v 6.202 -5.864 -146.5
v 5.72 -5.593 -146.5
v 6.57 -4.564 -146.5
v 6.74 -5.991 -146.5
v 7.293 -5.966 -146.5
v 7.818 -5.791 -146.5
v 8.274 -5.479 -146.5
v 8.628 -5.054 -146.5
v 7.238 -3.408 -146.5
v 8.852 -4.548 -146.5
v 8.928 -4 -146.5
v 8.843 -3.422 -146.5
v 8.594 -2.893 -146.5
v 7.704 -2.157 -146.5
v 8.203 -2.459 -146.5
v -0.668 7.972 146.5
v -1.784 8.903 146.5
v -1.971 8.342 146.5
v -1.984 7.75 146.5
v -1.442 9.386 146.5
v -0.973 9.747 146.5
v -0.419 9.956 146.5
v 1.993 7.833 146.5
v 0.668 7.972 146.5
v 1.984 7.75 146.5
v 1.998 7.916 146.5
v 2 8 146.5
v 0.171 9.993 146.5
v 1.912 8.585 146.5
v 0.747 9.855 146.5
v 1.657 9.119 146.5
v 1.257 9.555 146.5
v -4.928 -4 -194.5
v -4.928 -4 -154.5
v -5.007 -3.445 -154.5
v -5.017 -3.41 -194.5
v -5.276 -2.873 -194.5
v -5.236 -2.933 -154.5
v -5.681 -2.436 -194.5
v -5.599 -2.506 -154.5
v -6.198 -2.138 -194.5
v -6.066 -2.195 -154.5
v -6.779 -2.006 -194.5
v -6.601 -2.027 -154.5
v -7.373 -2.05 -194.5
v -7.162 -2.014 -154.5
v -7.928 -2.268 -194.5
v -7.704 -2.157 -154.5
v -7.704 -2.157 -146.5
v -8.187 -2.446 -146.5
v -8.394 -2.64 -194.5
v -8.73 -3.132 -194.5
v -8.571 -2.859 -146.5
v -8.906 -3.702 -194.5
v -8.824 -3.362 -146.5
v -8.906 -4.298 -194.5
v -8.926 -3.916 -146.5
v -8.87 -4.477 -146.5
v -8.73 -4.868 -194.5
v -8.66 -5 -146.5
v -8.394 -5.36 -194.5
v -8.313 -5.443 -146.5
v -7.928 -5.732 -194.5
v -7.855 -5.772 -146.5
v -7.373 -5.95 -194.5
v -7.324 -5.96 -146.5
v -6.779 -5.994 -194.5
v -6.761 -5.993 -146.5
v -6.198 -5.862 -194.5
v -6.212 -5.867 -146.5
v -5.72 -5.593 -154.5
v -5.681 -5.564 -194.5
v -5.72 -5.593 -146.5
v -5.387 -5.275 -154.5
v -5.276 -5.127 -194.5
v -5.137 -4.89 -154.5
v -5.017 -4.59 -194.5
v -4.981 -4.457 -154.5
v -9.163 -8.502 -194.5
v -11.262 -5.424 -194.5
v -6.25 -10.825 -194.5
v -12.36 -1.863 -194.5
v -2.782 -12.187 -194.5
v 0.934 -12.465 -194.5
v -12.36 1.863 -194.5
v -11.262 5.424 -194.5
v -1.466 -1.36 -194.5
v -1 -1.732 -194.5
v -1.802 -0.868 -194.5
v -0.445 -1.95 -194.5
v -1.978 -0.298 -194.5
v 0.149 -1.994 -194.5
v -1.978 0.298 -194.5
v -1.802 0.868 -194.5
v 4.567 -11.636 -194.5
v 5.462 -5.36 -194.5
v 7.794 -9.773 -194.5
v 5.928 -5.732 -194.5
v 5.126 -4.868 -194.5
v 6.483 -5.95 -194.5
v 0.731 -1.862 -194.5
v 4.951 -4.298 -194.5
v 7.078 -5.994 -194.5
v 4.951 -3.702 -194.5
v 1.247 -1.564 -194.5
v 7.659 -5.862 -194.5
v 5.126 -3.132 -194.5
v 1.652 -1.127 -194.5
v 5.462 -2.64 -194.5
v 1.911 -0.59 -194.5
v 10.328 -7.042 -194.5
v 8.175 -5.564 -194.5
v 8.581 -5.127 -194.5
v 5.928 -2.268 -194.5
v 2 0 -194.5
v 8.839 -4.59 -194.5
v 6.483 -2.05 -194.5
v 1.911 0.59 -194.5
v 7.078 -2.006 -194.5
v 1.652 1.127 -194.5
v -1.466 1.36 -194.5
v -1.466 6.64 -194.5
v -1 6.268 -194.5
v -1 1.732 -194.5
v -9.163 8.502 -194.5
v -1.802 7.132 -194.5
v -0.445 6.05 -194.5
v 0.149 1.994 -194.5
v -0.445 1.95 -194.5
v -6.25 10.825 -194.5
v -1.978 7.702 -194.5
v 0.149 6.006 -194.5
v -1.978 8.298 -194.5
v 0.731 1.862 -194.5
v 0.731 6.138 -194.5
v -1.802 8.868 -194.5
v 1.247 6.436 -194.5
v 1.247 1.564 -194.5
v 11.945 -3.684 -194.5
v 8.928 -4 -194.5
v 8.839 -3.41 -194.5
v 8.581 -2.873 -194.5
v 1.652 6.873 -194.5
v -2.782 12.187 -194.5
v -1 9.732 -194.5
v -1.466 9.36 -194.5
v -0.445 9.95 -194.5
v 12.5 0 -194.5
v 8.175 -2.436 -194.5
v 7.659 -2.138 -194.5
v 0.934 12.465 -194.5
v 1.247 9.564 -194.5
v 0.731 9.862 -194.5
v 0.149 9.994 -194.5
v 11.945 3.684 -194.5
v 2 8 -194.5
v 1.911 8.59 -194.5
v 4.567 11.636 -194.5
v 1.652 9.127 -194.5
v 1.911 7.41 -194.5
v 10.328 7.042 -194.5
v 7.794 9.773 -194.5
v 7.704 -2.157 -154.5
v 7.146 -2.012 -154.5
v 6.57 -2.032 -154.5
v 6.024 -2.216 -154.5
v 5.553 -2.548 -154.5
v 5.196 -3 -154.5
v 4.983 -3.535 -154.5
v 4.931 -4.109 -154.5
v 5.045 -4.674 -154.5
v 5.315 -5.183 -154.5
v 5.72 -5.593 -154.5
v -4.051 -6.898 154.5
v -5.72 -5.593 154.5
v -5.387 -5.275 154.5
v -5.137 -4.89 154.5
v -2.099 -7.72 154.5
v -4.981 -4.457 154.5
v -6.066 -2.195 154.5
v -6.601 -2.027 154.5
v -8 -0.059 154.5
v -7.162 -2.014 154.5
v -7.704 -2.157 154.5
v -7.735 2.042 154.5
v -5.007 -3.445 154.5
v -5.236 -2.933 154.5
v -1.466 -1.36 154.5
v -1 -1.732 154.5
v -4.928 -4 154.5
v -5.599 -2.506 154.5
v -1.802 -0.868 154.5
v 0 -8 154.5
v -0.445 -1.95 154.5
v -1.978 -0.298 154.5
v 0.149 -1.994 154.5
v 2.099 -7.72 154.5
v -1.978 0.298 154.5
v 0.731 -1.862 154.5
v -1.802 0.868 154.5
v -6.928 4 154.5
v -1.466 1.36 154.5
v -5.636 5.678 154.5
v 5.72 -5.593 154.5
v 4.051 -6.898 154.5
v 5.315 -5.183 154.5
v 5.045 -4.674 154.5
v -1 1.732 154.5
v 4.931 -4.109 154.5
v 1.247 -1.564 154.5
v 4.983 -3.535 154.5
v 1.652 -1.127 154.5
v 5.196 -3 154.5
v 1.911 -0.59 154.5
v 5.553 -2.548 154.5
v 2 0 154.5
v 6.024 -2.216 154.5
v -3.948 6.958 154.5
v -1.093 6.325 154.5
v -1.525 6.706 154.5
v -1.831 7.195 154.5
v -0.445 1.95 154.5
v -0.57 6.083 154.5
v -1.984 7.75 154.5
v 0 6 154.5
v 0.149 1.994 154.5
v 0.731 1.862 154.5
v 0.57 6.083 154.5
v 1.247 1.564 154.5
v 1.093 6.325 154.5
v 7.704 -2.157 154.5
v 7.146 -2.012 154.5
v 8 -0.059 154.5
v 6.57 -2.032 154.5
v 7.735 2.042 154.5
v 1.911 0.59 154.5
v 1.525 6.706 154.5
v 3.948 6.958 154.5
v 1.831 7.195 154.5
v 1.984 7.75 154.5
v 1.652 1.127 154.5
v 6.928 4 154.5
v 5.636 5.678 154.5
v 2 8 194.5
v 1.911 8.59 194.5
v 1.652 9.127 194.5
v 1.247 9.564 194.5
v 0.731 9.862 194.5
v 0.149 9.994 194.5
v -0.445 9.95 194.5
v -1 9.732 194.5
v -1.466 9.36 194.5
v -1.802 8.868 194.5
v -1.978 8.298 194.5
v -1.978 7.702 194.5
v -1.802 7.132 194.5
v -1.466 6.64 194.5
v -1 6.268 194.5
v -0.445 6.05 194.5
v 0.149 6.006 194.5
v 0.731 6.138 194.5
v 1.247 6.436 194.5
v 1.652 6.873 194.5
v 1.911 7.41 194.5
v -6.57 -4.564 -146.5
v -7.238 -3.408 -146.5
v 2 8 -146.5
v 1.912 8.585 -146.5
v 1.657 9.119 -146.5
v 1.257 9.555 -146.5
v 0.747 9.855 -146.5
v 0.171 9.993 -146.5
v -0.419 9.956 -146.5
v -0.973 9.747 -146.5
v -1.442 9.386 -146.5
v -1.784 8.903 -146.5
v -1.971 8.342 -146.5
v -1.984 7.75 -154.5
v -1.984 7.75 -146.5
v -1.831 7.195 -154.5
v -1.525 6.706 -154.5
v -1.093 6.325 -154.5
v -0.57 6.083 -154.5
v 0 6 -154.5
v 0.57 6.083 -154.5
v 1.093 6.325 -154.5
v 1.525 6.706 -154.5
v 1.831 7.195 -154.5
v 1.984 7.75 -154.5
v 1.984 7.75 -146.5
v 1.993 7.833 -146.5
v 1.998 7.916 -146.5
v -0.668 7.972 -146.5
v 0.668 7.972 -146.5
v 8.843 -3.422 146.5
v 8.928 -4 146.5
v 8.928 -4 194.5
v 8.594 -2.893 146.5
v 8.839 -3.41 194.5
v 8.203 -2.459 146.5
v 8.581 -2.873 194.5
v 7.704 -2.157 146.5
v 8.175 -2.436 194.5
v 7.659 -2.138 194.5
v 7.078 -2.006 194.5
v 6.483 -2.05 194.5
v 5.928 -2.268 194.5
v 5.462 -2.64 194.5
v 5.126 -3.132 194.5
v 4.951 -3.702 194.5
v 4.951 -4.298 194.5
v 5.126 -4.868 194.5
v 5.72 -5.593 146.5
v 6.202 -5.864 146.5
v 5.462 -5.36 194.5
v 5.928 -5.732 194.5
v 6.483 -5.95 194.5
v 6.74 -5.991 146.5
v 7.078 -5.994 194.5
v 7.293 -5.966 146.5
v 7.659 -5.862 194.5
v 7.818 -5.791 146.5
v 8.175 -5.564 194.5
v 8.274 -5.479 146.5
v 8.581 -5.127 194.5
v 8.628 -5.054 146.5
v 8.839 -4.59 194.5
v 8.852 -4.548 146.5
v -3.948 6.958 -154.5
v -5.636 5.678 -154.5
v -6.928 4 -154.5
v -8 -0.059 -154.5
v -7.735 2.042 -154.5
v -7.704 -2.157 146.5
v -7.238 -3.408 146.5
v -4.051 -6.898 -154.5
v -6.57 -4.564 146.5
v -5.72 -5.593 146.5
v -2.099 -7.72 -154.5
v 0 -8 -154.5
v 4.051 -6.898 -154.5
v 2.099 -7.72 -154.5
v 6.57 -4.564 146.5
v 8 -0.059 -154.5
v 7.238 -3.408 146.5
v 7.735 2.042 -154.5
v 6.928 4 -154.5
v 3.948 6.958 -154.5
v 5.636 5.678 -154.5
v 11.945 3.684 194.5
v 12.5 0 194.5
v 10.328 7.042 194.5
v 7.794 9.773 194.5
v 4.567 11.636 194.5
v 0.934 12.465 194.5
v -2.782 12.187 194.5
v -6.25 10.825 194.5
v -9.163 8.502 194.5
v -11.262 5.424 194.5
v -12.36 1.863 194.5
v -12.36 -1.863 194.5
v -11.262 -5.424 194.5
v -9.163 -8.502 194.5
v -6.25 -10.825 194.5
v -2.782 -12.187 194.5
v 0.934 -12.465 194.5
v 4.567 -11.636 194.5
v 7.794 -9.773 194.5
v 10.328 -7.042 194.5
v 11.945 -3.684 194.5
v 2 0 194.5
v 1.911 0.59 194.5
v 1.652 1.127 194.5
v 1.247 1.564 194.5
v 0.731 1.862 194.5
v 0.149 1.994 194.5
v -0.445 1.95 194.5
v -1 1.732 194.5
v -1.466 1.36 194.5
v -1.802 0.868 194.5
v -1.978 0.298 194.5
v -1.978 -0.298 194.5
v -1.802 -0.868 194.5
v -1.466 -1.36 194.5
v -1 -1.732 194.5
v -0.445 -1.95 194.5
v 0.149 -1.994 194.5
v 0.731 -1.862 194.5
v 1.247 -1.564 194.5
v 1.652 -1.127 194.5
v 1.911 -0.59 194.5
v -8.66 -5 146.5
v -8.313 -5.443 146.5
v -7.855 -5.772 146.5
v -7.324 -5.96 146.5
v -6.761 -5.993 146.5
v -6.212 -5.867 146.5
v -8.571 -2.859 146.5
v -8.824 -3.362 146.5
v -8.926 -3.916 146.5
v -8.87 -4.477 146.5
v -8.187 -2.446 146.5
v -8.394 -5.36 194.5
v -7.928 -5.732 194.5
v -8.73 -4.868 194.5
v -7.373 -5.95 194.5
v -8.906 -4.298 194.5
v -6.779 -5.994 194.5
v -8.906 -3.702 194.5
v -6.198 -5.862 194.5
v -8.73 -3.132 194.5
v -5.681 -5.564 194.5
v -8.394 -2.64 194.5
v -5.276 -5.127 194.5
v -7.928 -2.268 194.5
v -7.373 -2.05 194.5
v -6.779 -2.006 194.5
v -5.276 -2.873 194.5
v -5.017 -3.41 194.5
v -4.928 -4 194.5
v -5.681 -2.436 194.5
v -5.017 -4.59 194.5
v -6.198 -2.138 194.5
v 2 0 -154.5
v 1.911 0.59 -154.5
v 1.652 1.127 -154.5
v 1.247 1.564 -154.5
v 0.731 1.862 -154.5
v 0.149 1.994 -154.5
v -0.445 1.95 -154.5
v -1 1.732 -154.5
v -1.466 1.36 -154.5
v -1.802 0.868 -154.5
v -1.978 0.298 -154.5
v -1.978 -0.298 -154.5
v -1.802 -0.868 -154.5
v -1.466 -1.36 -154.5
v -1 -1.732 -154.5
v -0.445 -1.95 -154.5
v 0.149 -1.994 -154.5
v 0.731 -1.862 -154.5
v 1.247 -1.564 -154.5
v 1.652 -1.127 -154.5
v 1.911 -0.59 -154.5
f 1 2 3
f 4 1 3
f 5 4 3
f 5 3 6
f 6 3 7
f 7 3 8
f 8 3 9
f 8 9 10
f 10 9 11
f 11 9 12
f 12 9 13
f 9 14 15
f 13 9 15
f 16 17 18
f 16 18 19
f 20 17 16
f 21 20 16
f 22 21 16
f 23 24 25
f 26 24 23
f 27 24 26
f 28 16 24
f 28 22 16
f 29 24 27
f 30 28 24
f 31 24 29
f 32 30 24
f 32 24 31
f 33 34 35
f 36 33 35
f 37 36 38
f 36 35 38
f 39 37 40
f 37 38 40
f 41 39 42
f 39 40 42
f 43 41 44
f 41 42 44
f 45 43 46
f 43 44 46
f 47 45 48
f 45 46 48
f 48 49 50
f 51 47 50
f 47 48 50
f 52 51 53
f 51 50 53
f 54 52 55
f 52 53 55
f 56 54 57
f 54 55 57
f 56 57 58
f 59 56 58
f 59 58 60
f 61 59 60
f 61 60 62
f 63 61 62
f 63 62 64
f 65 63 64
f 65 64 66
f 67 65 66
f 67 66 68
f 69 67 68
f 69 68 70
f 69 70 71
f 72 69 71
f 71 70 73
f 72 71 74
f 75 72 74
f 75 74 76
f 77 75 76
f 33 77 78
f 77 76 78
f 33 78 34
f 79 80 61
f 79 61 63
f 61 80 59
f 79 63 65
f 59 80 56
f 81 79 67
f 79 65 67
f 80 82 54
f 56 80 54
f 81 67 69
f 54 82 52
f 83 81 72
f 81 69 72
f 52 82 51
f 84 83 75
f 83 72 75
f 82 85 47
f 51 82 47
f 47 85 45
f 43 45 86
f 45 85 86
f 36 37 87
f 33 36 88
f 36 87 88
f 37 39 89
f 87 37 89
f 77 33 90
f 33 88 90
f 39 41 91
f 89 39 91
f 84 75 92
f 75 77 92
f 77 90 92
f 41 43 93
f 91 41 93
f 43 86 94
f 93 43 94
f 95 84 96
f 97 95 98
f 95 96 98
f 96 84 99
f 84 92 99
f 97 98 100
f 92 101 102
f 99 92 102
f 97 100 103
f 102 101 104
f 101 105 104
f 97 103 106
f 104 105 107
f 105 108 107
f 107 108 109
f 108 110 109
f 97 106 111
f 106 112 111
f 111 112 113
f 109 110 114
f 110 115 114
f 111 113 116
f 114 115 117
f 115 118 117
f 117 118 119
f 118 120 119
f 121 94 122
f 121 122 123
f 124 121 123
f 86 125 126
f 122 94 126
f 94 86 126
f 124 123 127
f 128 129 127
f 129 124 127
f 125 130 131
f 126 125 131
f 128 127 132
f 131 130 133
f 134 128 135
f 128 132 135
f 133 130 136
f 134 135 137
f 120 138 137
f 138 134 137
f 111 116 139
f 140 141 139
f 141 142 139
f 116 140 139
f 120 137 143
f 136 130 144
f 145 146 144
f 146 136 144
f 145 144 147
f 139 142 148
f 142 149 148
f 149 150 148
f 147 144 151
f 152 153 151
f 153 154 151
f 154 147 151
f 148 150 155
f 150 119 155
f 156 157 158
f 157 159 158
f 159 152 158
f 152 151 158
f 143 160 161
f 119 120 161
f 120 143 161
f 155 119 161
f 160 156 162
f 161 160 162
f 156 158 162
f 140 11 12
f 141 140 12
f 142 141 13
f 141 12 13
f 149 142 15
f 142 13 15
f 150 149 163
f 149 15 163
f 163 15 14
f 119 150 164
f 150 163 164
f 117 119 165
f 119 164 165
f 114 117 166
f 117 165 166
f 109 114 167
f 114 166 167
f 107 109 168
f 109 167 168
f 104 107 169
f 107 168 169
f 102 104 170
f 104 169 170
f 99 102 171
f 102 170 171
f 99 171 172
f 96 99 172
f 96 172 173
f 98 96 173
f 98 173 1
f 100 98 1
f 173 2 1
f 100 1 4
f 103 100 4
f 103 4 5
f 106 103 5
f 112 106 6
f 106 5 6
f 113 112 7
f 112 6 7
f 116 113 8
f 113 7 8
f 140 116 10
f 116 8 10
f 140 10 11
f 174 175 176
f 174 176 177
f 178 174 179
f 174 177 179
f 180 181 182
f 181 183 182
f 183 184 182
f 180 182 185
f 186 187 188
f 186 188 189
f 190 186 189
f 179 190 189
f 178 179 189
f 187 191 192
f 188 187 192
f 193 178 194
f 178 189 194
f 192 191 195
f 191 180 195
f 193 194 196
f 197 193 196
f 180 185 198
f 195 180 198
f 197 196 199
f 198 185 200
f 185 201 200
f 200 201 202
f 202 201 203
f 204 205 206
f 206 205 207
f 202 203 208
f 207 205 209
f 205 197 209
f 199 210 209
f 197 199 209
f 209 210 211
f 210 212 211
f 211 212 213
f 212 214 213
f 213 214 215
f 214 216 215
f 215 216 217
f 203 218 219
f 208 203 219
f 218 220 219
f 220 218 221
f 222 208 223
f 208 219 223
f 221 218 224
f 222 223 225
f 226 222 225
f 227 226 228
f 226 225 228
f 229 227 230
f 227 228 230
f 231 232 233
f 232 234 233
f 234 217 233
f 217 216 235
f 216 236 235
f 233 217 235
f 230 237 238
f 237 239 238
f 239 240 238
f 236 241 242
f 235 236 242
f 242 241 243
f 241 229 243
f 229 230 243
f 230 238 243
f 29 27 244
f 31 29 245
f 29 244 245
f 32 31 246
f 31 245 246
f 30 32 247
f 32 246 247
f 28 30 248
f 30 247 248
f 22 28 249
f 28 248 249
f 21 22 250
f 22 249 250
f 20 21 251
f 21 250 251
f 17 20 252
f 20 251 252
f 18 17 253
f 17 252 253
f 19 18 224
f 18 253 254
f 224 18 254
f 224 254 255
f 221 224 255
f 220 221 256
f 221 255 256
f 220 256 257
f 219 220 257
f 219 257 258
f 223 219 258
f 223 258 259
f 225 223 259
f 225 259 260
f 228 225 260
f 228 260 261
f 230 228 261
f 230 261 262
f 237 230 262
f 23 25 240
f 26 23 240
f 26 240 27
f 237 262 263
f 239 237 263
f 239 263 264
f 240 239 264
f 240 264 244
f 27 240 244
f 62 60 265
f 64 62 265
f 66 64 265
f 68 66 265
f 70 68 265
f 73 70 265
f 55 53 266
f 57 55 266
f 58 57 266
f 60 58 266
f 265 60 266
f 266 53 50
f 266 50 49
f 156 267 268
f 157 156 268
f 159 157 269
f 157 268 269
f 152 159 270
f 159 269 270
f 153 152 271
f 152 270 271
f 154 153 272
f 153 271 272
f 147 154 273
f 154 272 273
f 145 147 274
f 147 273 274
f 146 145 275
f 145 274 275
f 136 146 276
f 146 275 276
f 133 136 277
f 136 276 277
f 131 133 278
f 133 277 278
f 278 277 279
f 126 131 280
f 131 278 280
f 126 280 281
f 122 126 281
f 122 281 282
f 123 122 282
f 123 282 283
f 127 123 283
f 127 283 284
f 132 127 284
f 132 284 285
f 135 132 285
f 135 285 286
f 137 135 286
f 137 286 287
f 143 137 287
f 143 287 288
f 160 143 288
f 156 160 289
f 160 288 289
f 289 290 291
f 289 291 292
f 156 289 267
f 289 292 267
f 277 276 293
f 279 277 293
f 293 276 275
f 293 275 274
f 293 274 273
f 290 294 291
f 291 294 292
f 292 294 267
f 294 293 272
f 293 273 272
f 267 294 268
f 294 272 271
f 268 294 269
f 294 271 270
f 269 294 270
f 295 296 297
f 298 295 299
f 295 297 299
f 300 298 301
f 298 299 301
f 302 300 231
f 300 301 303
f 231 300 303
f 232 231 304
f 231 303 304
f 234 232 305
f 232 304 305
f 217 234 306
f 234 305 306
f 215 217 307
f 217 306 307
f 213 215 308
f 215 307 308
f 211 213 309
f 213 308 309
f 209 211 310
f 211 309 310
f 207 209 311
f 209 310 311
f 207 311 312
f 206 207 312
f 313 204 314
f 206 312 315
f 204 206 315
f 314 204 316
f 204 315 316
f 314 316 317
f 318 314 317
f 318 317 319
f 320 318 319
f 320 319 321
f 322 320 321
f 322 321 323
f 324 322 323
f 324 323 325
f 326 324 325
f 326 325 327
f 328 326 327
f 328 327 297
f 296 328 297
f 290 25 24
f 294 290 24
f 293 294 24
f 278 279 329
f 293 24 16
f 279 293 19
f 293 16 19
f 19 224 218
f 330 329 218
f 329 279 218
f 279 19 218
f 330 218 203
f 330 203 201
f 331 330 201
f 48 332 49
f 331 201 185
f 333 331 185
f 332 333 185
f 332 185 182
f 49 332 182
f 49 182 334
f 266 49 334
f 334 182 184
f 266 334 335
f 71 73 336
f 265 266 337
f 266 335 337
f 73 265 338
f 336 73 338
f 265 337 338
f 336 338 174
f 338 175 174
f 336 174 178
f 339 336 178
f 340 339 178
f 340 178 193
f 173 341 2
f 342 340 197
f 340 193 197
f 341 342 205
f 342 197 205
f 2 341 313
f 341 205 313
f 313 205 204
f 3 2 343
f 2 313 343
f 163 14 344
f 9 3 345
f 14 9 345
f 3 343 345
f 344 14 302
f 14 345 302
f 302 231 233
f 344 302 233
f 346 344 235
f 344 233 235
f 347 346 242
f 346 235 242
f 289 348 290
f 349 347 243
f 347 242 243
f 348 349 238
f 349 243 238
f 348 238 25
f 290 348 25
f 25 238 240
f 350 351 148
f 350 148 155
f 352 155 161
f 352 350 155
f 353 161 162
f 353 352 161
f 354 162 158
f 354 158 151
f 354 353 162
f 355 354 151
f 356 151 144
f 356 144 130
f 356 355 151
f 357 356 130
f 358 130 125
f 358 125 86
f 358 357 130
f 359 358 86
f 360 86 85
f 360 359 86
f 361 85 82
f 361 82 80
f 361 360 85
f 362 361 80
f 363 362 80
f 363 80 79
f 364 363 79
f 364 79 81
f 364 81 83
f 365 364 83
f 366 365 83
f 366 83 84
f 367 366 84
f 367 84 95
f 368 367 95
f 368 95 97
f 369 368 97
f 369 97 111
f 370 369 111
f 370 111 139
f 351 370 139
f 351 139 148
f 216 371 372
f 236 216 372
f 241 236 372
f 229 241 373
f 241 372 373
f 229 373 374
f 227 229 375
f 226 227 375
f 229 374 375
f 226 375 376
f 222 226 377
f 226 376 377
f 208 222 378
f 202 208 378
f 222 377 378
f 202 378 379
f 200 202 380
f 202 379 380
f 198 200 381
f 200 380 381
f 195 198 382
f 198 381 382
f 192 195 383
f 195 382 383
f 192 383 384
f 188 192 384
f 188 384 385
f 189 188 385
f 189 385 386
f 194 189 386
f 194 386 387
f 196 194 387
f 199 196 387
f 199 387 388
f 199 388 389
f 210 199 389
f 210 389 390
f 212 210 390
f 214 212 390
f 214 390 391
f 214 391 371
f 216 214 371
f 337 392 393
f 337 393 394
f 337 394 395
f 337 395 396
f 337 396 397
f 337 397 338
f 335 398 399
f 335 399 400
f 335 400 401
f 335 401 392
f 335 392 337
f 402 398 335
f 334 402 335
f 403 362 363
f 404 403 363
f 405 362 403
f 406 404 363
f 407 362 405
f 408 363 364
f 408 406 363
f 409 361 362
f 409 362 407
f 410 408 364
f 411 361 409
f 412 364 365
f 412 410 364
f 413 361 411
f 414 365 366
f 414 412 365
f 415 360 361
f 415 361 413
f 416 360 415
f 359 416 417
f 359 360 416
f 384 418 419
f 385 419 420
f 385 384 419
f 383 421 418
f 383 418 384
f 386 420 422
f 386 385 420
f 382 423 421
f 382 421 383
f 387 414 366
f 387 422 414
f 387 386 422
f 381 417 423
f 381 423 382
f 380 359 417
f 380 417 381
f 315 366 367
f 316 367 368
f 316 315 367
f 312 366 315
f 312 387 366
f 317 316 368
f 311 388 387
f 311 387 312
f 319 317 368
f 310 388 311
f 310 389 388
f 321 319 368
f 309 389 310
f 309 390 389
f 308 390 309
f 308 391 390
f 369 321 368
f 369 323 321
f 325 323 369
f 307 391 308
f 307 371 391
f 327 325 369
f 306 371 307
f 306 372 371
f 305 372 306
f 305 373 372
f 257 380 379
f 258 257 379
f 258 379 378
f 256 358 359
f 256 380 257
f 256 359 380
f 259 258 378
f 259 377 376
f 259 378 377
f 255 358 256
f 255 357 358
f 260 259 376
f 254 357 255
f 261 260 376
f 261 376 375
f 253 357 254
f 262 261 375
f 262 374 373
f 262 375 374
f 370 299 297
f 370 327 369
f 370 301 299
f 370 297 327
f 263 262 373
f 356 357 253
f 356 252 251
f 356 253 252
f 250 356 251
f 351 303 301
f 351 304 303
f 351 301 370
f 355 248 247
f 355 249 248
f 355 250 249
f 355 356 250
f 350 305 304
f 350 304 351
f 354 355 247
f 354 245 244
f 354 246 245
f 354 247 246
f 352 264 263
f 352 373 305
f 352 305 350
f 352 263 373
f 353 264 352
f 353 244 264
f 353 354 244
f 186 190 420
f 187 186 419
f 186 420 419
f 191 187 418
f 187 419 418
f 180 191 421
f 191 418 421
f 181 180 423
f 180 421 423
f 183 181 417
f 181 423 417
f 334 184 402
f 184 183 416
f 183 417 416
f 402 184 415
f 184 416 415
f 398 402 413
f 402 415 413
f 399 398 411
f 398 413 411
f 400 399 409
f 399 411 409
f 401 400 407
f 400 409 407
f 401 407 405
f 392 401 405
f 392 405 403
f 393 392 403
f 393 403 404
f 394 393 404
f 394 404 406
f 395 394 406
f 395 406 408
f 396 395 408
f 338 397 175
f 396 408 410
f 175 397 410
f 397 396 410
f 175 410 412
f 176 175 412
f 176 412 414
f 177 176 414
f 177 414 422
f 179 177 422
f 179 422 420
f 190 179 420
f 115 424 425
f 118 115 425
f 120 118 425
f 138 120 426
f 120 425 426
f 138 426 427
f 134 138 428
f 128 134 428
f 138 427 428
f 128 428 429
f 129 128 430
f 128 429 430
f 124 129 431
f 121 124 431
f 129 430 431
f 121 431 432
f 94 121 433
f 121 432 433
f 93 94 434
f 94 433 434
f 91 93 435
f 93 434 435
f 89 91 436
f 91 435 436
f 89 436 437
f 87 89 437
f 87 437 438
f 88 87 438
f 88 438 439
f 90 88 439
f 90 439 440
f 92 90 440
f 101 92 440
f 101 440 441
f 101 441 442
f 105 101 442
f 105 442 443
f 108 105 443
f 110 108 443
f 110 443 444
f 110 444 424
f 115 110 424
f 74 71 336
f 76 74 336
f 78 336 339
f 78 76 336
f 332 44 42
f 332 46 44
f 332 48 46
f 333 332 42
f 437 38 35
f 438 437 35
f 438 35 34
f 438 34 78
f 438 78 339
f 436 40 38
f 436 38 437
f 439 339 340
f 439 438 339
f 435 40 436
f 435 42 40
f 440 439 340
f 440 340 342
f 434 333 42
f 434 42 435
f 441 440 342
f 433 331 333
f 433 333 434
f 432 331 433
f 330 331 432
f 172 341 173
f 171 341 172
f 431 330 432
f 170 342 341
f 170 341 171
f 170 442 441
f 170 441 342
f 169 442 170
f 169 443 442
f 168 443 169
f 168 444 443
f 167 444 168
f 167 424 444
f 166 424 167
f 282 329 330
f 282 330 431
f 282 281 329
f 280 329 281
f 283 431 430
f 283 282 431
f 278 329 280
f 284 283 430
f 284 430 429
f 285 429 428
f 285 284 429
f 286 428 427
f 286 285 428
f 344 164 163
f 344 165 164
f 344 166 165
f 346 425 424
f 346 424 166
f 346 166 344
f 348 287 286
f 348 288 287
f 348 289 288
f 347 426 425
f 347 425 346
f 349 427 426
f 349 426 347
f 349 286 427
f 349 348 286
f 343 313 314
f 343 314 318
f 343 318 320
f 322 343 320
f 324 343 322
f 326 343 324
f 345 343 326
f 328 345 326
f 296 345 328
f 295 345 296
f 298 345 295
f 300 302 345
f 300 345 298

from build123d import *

# Parameters (mm, degrees)
SKETCH_1_R          = 12.5
EXTRUDE_1_DEPTH     = 194.5
SKETCH_2_R          = 8
CUT_EXTRUDE_1_DEPTH = 349
SKETCH_3_R          = 10
EXTRUDE_2_DEPTH     = 40
SKETCH_4_R          = 2
CUT_EXTRUDE_2_DEPTH = 1000
SKETCH_5_R          = 12.5
SKETCH_5_R_2        = 8
EXTRUDE_4_DEPTH     = 146.5
EXTRUDE_START       = 146.5
SKETCH_7_R          = 11.680413058
SKETCH_7_R_2        = 8
EXTRUDE_7_DEPTH     = 146.5


with BuildPart() as part:
    # 草图1 → 凸台-拉伸1 (new, symmetric)
    with BuildSketch(Plane.XY):
        Circle(SKETCH_1_R)
    extrude(amount=EXTRUDE_1_DEPTH, both=True)

    # 草图2 → 切除-拉伸1 (cut)
    with BuildSketch(Plane.XY.offset(194.5)):
        Circle(SKETCH_2_R)
    extrude(amount=-CUT_EXTRUDE_1_DEPTH, mode=Mode.SUBTRACT)

    # 草图3 → 凸台-拉伸2 (add)
    with BuildSketch(Plane.XY.offset(194.5)):
        Circle(SKETCH_3_R)
    extrude(amount=-EXTRUDE_2_DEPTH)

    # 草图4 → 切除-拉伸2 (cut)
    with BuildSketch(Plane.XY.offset(194.5)):
        with Locations((0, 8)):
            Circle(SKETCH_4_R)
        with Locations((-6.92820323, -4)):
            Circle(SKETCH_4_R)
        with Locations((6.92820323, -4)):
            Circle(SKETCH_4_R)
        Circle(SKETCH_4_R)
    extrude(amount=-CUT_EXTRUDE_2_DEPTH, mode=Mode.SUBTRACT)

    # 草图5 → 凸台-拉伸4 (add)
    with BuildSketch(Plane.XY):
        Circle(SKETCH_5_R)
        with Locations(Location((0, 0, 0), (0, 0, 344.361511563))):
            Circle(SKETCH_5_R_2, mode=Mode.SUBTRACT)
    extrude(amount=-EXTRUDE_4_DEPTH)

    # 草图7 → 凸台-拉伸7 (add)
    with BuildSketch(Plane.XY.offset(EXTRUDE_START)):
        Circle(SKETCH_7_R)
        with Locations(Location((0, 0, 0), (0, 0, 344.361511563))):
            Circle(SKETCH_7_R_2, mode=Mode.SUBTRACT)
    extrude(amount=-EXTRUDE_7_DEPTH)


solid = part.part
